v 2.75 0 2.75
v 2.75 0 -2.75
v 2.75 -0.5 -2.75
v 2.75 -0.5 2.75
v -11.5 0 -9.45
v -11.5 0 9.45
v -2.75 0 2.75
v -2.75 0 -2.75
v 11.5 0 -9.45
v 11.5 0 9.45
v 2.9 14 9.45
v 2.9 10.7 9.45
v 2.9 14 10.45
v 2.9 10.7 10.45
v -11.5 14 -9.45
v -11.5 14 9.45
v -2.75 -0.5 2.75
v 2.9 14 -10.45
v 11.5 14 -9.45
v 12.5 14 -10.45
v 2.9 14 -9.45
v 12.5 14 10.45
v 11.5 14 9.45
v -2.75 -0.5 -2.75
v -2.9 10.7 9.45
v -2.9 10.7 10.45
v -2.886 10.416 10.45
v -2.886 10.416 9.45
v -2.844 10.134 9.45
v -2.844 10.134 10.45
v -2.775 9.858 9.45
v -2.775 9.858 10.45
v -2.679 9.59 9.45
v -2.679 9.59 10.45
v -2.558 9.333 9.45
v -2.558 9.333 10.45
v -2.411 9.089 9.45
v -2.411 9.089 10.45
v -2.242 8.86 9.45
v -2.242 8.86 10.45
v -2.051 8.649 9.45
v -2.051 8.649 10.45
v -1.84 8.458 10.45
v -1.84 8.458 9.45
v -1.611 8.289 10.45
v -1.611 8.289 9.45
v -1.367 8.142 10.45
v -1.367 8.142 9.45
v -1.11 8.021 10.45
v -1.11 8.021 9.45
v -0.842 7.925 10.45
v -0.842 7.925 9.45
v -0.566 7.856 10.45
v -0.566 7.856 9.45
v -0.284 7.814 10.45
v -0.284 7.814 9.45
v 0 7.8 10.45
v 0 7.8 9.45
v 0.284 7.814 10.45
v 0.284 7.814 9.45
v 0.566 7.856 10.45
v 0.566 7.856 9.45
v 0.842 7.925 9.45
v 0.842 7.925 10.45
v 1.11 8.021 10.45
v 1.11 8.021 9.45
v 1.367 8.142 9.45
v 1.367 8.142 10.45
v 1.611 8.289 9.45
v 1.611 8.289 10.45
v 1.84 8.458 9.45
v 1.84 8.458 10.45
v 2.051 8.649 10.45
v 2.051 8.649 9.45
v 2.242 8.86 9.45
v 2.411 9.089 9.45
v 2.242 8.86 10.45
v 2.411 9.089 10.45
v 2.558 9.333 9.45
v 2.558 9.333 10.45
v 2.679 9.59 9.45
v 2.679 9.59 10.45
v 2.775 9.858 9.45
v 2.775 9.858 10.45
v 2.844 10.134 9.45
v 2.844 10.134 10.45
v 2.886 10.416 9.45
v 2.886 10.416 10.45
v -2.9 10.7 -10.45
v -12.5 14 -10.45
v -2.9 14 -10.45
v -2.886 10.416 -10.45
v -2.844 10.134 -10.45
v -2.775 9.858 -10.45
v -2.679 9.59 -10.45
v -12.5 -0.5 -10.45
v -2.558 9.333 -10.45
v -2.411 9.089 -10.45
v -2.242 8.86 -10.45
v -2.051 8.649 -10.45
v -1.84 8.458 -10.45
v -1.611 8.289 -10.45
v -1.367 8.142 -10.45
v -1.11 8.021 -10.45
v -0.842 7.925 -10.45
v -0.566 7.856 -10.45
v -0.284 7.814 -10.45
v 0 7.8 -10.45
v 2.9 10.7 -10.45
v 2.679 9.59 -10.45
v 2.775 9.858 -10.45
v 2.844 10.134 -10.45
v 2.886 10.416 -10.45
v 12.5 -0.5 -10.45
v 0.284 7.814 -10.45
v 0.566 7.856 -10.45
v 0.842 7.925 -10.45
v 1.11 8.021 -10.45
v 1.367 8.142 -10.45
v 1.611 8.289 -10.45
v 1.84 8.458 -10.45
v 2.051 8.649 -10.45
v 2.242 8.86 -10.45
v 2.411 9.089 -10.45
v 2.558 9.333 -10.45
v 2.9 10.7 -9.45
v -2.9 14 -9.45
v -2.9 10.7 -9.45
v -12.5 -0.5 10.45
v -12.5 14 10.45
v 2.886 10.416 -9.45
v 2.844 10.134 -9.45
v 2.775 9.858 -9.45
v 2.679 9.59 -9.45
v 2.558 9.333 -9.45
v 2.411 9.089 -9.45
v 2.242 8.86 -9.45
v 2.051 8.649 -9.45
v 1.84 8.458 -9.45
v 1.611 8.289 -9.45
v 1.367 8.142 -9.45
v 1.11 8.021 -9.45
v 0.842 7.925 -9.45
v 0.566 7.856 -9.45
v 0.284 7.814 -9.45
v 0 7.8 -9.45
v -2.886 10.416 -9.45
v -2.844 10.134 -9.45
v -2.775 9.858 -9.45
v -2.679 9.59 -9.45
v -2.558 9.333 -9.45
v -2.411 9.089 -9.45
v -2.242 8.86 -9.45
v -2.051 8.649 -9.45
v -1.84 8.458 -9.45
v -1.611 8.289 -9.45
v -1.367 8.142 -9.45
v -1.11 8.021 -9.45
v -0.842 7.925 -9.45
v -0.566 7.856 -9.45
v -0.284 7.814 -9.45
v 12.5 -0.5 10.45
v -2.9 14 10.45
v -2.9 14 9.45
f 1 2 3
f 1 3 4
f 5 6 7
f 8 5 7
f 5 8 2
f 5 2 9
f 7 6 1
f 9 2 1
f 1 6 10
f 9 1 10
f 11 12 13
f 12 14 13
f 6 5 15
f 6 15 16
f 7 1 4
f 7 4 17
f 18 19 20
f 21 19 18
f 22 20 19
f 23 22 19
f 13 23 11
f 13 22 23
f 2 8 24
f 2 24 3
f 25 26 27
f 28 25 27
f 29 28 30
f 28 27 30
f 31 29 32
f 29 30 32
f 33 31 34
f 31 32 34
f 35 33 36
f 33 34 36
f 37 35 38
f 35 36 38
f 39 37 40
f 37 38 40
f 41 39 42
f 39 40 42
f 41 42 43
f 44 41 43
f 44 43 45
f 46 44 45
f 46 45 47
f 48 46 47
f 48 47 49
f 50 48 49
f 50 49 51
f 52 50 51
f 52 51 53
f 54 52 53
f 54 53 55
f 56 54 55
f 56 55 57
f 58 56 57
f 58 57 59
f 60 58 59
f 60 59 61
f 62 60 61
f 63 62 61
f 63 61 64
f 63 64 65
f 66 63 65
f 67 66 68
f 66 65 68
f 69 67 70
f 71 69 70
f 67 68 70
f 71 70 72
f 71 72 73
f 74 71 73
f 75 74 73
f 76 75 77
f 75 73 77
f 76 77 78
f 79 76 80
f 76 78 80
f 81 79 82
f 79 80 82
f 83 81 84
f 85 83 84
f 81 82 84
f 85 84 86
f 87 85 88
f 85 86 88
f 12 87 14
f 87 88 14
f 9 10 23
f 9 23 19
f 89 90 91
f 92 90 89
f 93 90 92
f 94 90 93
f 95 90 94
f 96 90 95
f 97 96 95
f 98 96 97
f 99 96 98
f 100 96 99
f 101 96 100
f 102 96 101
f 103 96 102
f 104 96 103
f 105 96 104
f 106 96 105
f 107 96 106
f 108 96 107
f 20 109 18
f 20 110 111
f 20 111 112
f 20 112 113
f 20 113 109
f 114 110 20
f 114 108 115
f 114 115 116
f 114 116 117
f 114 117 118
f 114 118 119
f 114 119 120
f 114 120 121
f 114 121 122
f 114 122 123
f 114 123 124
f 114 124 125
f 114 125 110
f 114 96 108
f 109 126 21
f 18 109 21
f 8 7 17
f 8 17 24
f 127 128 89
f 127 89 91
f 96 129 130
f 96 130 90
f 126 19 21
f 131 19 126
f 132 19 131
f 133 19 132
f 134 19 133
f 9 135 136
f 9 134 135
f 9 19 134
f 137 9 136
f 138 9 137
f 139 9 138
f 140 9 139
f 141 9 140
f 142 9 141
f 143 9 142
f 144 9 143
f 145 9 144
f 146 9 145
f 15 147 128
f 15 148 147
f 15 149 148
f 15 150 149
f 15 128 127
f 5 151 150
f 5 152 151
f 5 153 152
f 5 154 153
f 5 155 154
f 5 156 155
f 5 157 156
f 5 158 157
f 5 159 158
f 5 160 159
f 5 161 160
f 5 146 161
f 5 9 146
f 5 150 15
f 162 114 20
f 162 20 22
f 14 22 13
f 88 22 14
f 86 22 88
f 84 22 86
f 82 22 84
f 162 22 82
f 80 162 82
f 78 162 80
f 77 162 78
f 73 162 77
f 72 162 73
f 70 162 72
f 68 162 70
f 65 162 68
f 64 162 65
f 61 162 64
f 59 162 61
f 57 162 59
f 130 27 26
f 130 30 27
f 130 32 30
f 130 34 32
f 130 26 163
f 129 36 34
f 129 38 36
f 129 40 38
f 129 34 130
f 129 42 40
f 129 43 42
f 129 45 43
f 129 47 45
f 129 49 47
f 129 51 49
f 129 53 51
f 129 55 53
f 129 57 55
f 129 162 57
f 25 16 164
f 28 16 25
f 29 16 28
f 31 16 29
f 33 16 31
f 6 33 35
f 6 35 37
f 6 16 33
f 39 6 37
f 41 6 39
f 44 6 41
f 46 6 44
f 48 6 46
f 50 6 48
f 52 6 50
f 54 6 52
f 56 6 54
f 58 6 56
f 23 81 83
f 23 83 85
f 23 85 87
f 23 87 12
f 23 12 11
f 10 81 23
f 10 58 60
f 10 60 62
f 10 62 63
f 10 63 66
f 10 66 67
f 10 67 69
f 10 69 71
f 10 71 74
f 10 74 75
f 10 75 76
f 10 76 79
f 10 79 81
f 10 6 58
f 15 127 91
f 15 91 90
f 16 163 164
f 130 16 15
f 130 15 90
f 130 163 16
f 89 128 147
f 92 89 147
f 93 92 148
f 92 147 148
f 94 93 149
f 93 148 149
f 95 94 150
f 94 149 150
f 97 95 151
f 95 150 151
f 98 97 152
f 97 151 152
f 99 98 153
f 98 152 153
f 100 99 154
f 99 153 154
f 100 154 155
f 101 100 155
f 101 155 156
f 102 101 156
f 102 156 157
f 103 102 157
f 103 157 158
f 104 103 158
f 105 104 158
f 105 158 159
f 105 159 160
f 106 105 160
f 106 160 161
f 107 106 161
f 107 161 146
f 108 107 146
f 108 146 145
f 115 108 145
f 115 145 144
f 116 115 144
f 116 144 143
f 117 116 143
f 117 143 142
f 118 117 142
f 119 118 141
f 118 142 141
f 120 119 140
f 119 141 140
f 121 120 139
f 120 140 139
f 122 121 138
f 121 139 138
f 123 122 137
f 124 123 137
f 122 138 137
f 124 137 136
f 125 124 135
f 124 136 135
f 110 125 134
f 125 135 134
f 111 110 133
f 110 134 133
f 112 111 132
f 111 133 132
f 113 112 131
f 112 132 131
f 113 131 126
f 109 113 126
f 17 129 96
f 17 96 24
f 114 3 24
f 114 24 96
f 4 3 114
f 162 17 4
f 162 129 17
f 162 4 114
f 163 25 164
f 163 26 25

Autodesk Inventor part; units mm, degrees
ref_plane "YZ Plane" through (0, 0, 0) normal (1, 0, 0) x (0, 1, 0)
ref_plane "XZ Plane" through (0, 0, 0) normal (0, 1, 0) x (-1, 0, 0)
ref_plane "XY Plane" through (0, 0, 0) normal (0, 0, 1) x (1, 0, 0)
sketch "Sketch1" plane through (0, 0, 0) normal (0, 1, 0) x (-1, 0, 0)
  line L0 (-11.5, -9.45) -> (11.5, -9.45)
  line L1 (11.5, -9.45) -> (11.5, 9.45)
  line L2 (11.5, 9.45) -> (-11.5, 9.45)
  line L3 (-11.5, 9.45) -> (-11.5, -9.45)
  line L4 (12.5, -10.45) -> (-12.5, -10.45)
  line L5 (-12.5, -10.45) -> (-12.5, 10.45)
  line L6 (-12.5, 10.45) -> (12.5, 10.45)
  line L7 (12.5, 10.45) -> (12.5, -10.45)
  point P0 (0, 0)
  dimension "d0" = 23
  dimension "d4" = 9.45
  dimension "d6" = 11.5
  dimension "d21" = 18.9
  dimension "d22" = 20.9
  dimension "d23" = 10.45
  dimension "d24" = 25
  dimension "d25" = 12.5
extrude "Extrusion1" add sketch "Sketch1" along normal blind 14
sketch "Sketch2" plane through (0, 0, 0) normal (0, -1, 0) x (1, 0, 0)
  line L0 (2.75, 2.75) -> (-2.75, 2.75)
  line L1 (-2.75, 2.75) -> (-2.75, -2.75)
  line L2 (-2.75, -2.75) -> (2.75, -2.75)
  line L3 (2.75, -2.75) -> (2.75, 2.75)
  line L4 (-12.5, -10.45) -> (-12.5, 10.45) projected
  line L5 (-12.5, 10.45) -> (12.5, 10.45) projected
  line L6 (-12.5, -10.45) -> (-12.5, 10.45) projected
  line L7 (12.5, -10.45) -> (-12.5, -10.45) projected
  line L8 (-12.5, 10.45) -> (12.5, 10.45)
  line L9 (12.5, 10.45) -> (12.5, -10.45)
  line L10 (12.5, -10.45) -> (-12.5, -10.45)
  line L11 (-12.5, -10.45) -> (-12.5, 10.45)
  point P0 (0, 0)
  dimension "d10" = 5.5
  dimension "d11" = 5.5
  dimension "d26" = 2.75
  dimension "d27" = 2.75
extrude "Extrusion2" add sketch "Sketch2" along normal blind 0.5
sketch "Sketch4" plane through (-12.5, 14, 10.45) normal (0, 0, 1) x (1, 0, 0)
  line L0 (25, -14.5) -> (0, -14.5) projected
  line L1 (12.5, -14.5) -> (12.5, -3.3) construction
  line L2 (0, 0) -> (0, -14.5) projected
  circle A0 centre (12.5, -3.3) radius 2.9
  line L3 (0, 0) -> (25, 0) projected
  line L4 (12.5, -3.3) -> (15.4, -3.3) construction
  line L5 (12.5, -3.3) -> (9.6, -3.3) construction
  line L6 (15.4, -3.3) -> (15.4, 0)
  line L7 (9.6, -3.3) -> (9.6, 0)
  point P0 (12.5, -14)
  dimension "d28" = 12.5
  dimension "d29" = 11.2
  dimension "d30" = 5.8
extrude "Extrusion4" cut sketch "Sketch4" against normal through all
equation "\"d4\" = 0.5 * d1"
equation "\"d6\" = 0.5 * d0"
equation "\"d23\" = 0.5 * d22"
equation "\"d25\" = 0.5 * d24"
equation "\"d11\" = d10"
equation "\"d26\" = 0.5 * d10"
equation "\"d27\" = 0.5 * d11"
equation "\"d1\" = 18.9"
properties part number "motor_holder#1"
